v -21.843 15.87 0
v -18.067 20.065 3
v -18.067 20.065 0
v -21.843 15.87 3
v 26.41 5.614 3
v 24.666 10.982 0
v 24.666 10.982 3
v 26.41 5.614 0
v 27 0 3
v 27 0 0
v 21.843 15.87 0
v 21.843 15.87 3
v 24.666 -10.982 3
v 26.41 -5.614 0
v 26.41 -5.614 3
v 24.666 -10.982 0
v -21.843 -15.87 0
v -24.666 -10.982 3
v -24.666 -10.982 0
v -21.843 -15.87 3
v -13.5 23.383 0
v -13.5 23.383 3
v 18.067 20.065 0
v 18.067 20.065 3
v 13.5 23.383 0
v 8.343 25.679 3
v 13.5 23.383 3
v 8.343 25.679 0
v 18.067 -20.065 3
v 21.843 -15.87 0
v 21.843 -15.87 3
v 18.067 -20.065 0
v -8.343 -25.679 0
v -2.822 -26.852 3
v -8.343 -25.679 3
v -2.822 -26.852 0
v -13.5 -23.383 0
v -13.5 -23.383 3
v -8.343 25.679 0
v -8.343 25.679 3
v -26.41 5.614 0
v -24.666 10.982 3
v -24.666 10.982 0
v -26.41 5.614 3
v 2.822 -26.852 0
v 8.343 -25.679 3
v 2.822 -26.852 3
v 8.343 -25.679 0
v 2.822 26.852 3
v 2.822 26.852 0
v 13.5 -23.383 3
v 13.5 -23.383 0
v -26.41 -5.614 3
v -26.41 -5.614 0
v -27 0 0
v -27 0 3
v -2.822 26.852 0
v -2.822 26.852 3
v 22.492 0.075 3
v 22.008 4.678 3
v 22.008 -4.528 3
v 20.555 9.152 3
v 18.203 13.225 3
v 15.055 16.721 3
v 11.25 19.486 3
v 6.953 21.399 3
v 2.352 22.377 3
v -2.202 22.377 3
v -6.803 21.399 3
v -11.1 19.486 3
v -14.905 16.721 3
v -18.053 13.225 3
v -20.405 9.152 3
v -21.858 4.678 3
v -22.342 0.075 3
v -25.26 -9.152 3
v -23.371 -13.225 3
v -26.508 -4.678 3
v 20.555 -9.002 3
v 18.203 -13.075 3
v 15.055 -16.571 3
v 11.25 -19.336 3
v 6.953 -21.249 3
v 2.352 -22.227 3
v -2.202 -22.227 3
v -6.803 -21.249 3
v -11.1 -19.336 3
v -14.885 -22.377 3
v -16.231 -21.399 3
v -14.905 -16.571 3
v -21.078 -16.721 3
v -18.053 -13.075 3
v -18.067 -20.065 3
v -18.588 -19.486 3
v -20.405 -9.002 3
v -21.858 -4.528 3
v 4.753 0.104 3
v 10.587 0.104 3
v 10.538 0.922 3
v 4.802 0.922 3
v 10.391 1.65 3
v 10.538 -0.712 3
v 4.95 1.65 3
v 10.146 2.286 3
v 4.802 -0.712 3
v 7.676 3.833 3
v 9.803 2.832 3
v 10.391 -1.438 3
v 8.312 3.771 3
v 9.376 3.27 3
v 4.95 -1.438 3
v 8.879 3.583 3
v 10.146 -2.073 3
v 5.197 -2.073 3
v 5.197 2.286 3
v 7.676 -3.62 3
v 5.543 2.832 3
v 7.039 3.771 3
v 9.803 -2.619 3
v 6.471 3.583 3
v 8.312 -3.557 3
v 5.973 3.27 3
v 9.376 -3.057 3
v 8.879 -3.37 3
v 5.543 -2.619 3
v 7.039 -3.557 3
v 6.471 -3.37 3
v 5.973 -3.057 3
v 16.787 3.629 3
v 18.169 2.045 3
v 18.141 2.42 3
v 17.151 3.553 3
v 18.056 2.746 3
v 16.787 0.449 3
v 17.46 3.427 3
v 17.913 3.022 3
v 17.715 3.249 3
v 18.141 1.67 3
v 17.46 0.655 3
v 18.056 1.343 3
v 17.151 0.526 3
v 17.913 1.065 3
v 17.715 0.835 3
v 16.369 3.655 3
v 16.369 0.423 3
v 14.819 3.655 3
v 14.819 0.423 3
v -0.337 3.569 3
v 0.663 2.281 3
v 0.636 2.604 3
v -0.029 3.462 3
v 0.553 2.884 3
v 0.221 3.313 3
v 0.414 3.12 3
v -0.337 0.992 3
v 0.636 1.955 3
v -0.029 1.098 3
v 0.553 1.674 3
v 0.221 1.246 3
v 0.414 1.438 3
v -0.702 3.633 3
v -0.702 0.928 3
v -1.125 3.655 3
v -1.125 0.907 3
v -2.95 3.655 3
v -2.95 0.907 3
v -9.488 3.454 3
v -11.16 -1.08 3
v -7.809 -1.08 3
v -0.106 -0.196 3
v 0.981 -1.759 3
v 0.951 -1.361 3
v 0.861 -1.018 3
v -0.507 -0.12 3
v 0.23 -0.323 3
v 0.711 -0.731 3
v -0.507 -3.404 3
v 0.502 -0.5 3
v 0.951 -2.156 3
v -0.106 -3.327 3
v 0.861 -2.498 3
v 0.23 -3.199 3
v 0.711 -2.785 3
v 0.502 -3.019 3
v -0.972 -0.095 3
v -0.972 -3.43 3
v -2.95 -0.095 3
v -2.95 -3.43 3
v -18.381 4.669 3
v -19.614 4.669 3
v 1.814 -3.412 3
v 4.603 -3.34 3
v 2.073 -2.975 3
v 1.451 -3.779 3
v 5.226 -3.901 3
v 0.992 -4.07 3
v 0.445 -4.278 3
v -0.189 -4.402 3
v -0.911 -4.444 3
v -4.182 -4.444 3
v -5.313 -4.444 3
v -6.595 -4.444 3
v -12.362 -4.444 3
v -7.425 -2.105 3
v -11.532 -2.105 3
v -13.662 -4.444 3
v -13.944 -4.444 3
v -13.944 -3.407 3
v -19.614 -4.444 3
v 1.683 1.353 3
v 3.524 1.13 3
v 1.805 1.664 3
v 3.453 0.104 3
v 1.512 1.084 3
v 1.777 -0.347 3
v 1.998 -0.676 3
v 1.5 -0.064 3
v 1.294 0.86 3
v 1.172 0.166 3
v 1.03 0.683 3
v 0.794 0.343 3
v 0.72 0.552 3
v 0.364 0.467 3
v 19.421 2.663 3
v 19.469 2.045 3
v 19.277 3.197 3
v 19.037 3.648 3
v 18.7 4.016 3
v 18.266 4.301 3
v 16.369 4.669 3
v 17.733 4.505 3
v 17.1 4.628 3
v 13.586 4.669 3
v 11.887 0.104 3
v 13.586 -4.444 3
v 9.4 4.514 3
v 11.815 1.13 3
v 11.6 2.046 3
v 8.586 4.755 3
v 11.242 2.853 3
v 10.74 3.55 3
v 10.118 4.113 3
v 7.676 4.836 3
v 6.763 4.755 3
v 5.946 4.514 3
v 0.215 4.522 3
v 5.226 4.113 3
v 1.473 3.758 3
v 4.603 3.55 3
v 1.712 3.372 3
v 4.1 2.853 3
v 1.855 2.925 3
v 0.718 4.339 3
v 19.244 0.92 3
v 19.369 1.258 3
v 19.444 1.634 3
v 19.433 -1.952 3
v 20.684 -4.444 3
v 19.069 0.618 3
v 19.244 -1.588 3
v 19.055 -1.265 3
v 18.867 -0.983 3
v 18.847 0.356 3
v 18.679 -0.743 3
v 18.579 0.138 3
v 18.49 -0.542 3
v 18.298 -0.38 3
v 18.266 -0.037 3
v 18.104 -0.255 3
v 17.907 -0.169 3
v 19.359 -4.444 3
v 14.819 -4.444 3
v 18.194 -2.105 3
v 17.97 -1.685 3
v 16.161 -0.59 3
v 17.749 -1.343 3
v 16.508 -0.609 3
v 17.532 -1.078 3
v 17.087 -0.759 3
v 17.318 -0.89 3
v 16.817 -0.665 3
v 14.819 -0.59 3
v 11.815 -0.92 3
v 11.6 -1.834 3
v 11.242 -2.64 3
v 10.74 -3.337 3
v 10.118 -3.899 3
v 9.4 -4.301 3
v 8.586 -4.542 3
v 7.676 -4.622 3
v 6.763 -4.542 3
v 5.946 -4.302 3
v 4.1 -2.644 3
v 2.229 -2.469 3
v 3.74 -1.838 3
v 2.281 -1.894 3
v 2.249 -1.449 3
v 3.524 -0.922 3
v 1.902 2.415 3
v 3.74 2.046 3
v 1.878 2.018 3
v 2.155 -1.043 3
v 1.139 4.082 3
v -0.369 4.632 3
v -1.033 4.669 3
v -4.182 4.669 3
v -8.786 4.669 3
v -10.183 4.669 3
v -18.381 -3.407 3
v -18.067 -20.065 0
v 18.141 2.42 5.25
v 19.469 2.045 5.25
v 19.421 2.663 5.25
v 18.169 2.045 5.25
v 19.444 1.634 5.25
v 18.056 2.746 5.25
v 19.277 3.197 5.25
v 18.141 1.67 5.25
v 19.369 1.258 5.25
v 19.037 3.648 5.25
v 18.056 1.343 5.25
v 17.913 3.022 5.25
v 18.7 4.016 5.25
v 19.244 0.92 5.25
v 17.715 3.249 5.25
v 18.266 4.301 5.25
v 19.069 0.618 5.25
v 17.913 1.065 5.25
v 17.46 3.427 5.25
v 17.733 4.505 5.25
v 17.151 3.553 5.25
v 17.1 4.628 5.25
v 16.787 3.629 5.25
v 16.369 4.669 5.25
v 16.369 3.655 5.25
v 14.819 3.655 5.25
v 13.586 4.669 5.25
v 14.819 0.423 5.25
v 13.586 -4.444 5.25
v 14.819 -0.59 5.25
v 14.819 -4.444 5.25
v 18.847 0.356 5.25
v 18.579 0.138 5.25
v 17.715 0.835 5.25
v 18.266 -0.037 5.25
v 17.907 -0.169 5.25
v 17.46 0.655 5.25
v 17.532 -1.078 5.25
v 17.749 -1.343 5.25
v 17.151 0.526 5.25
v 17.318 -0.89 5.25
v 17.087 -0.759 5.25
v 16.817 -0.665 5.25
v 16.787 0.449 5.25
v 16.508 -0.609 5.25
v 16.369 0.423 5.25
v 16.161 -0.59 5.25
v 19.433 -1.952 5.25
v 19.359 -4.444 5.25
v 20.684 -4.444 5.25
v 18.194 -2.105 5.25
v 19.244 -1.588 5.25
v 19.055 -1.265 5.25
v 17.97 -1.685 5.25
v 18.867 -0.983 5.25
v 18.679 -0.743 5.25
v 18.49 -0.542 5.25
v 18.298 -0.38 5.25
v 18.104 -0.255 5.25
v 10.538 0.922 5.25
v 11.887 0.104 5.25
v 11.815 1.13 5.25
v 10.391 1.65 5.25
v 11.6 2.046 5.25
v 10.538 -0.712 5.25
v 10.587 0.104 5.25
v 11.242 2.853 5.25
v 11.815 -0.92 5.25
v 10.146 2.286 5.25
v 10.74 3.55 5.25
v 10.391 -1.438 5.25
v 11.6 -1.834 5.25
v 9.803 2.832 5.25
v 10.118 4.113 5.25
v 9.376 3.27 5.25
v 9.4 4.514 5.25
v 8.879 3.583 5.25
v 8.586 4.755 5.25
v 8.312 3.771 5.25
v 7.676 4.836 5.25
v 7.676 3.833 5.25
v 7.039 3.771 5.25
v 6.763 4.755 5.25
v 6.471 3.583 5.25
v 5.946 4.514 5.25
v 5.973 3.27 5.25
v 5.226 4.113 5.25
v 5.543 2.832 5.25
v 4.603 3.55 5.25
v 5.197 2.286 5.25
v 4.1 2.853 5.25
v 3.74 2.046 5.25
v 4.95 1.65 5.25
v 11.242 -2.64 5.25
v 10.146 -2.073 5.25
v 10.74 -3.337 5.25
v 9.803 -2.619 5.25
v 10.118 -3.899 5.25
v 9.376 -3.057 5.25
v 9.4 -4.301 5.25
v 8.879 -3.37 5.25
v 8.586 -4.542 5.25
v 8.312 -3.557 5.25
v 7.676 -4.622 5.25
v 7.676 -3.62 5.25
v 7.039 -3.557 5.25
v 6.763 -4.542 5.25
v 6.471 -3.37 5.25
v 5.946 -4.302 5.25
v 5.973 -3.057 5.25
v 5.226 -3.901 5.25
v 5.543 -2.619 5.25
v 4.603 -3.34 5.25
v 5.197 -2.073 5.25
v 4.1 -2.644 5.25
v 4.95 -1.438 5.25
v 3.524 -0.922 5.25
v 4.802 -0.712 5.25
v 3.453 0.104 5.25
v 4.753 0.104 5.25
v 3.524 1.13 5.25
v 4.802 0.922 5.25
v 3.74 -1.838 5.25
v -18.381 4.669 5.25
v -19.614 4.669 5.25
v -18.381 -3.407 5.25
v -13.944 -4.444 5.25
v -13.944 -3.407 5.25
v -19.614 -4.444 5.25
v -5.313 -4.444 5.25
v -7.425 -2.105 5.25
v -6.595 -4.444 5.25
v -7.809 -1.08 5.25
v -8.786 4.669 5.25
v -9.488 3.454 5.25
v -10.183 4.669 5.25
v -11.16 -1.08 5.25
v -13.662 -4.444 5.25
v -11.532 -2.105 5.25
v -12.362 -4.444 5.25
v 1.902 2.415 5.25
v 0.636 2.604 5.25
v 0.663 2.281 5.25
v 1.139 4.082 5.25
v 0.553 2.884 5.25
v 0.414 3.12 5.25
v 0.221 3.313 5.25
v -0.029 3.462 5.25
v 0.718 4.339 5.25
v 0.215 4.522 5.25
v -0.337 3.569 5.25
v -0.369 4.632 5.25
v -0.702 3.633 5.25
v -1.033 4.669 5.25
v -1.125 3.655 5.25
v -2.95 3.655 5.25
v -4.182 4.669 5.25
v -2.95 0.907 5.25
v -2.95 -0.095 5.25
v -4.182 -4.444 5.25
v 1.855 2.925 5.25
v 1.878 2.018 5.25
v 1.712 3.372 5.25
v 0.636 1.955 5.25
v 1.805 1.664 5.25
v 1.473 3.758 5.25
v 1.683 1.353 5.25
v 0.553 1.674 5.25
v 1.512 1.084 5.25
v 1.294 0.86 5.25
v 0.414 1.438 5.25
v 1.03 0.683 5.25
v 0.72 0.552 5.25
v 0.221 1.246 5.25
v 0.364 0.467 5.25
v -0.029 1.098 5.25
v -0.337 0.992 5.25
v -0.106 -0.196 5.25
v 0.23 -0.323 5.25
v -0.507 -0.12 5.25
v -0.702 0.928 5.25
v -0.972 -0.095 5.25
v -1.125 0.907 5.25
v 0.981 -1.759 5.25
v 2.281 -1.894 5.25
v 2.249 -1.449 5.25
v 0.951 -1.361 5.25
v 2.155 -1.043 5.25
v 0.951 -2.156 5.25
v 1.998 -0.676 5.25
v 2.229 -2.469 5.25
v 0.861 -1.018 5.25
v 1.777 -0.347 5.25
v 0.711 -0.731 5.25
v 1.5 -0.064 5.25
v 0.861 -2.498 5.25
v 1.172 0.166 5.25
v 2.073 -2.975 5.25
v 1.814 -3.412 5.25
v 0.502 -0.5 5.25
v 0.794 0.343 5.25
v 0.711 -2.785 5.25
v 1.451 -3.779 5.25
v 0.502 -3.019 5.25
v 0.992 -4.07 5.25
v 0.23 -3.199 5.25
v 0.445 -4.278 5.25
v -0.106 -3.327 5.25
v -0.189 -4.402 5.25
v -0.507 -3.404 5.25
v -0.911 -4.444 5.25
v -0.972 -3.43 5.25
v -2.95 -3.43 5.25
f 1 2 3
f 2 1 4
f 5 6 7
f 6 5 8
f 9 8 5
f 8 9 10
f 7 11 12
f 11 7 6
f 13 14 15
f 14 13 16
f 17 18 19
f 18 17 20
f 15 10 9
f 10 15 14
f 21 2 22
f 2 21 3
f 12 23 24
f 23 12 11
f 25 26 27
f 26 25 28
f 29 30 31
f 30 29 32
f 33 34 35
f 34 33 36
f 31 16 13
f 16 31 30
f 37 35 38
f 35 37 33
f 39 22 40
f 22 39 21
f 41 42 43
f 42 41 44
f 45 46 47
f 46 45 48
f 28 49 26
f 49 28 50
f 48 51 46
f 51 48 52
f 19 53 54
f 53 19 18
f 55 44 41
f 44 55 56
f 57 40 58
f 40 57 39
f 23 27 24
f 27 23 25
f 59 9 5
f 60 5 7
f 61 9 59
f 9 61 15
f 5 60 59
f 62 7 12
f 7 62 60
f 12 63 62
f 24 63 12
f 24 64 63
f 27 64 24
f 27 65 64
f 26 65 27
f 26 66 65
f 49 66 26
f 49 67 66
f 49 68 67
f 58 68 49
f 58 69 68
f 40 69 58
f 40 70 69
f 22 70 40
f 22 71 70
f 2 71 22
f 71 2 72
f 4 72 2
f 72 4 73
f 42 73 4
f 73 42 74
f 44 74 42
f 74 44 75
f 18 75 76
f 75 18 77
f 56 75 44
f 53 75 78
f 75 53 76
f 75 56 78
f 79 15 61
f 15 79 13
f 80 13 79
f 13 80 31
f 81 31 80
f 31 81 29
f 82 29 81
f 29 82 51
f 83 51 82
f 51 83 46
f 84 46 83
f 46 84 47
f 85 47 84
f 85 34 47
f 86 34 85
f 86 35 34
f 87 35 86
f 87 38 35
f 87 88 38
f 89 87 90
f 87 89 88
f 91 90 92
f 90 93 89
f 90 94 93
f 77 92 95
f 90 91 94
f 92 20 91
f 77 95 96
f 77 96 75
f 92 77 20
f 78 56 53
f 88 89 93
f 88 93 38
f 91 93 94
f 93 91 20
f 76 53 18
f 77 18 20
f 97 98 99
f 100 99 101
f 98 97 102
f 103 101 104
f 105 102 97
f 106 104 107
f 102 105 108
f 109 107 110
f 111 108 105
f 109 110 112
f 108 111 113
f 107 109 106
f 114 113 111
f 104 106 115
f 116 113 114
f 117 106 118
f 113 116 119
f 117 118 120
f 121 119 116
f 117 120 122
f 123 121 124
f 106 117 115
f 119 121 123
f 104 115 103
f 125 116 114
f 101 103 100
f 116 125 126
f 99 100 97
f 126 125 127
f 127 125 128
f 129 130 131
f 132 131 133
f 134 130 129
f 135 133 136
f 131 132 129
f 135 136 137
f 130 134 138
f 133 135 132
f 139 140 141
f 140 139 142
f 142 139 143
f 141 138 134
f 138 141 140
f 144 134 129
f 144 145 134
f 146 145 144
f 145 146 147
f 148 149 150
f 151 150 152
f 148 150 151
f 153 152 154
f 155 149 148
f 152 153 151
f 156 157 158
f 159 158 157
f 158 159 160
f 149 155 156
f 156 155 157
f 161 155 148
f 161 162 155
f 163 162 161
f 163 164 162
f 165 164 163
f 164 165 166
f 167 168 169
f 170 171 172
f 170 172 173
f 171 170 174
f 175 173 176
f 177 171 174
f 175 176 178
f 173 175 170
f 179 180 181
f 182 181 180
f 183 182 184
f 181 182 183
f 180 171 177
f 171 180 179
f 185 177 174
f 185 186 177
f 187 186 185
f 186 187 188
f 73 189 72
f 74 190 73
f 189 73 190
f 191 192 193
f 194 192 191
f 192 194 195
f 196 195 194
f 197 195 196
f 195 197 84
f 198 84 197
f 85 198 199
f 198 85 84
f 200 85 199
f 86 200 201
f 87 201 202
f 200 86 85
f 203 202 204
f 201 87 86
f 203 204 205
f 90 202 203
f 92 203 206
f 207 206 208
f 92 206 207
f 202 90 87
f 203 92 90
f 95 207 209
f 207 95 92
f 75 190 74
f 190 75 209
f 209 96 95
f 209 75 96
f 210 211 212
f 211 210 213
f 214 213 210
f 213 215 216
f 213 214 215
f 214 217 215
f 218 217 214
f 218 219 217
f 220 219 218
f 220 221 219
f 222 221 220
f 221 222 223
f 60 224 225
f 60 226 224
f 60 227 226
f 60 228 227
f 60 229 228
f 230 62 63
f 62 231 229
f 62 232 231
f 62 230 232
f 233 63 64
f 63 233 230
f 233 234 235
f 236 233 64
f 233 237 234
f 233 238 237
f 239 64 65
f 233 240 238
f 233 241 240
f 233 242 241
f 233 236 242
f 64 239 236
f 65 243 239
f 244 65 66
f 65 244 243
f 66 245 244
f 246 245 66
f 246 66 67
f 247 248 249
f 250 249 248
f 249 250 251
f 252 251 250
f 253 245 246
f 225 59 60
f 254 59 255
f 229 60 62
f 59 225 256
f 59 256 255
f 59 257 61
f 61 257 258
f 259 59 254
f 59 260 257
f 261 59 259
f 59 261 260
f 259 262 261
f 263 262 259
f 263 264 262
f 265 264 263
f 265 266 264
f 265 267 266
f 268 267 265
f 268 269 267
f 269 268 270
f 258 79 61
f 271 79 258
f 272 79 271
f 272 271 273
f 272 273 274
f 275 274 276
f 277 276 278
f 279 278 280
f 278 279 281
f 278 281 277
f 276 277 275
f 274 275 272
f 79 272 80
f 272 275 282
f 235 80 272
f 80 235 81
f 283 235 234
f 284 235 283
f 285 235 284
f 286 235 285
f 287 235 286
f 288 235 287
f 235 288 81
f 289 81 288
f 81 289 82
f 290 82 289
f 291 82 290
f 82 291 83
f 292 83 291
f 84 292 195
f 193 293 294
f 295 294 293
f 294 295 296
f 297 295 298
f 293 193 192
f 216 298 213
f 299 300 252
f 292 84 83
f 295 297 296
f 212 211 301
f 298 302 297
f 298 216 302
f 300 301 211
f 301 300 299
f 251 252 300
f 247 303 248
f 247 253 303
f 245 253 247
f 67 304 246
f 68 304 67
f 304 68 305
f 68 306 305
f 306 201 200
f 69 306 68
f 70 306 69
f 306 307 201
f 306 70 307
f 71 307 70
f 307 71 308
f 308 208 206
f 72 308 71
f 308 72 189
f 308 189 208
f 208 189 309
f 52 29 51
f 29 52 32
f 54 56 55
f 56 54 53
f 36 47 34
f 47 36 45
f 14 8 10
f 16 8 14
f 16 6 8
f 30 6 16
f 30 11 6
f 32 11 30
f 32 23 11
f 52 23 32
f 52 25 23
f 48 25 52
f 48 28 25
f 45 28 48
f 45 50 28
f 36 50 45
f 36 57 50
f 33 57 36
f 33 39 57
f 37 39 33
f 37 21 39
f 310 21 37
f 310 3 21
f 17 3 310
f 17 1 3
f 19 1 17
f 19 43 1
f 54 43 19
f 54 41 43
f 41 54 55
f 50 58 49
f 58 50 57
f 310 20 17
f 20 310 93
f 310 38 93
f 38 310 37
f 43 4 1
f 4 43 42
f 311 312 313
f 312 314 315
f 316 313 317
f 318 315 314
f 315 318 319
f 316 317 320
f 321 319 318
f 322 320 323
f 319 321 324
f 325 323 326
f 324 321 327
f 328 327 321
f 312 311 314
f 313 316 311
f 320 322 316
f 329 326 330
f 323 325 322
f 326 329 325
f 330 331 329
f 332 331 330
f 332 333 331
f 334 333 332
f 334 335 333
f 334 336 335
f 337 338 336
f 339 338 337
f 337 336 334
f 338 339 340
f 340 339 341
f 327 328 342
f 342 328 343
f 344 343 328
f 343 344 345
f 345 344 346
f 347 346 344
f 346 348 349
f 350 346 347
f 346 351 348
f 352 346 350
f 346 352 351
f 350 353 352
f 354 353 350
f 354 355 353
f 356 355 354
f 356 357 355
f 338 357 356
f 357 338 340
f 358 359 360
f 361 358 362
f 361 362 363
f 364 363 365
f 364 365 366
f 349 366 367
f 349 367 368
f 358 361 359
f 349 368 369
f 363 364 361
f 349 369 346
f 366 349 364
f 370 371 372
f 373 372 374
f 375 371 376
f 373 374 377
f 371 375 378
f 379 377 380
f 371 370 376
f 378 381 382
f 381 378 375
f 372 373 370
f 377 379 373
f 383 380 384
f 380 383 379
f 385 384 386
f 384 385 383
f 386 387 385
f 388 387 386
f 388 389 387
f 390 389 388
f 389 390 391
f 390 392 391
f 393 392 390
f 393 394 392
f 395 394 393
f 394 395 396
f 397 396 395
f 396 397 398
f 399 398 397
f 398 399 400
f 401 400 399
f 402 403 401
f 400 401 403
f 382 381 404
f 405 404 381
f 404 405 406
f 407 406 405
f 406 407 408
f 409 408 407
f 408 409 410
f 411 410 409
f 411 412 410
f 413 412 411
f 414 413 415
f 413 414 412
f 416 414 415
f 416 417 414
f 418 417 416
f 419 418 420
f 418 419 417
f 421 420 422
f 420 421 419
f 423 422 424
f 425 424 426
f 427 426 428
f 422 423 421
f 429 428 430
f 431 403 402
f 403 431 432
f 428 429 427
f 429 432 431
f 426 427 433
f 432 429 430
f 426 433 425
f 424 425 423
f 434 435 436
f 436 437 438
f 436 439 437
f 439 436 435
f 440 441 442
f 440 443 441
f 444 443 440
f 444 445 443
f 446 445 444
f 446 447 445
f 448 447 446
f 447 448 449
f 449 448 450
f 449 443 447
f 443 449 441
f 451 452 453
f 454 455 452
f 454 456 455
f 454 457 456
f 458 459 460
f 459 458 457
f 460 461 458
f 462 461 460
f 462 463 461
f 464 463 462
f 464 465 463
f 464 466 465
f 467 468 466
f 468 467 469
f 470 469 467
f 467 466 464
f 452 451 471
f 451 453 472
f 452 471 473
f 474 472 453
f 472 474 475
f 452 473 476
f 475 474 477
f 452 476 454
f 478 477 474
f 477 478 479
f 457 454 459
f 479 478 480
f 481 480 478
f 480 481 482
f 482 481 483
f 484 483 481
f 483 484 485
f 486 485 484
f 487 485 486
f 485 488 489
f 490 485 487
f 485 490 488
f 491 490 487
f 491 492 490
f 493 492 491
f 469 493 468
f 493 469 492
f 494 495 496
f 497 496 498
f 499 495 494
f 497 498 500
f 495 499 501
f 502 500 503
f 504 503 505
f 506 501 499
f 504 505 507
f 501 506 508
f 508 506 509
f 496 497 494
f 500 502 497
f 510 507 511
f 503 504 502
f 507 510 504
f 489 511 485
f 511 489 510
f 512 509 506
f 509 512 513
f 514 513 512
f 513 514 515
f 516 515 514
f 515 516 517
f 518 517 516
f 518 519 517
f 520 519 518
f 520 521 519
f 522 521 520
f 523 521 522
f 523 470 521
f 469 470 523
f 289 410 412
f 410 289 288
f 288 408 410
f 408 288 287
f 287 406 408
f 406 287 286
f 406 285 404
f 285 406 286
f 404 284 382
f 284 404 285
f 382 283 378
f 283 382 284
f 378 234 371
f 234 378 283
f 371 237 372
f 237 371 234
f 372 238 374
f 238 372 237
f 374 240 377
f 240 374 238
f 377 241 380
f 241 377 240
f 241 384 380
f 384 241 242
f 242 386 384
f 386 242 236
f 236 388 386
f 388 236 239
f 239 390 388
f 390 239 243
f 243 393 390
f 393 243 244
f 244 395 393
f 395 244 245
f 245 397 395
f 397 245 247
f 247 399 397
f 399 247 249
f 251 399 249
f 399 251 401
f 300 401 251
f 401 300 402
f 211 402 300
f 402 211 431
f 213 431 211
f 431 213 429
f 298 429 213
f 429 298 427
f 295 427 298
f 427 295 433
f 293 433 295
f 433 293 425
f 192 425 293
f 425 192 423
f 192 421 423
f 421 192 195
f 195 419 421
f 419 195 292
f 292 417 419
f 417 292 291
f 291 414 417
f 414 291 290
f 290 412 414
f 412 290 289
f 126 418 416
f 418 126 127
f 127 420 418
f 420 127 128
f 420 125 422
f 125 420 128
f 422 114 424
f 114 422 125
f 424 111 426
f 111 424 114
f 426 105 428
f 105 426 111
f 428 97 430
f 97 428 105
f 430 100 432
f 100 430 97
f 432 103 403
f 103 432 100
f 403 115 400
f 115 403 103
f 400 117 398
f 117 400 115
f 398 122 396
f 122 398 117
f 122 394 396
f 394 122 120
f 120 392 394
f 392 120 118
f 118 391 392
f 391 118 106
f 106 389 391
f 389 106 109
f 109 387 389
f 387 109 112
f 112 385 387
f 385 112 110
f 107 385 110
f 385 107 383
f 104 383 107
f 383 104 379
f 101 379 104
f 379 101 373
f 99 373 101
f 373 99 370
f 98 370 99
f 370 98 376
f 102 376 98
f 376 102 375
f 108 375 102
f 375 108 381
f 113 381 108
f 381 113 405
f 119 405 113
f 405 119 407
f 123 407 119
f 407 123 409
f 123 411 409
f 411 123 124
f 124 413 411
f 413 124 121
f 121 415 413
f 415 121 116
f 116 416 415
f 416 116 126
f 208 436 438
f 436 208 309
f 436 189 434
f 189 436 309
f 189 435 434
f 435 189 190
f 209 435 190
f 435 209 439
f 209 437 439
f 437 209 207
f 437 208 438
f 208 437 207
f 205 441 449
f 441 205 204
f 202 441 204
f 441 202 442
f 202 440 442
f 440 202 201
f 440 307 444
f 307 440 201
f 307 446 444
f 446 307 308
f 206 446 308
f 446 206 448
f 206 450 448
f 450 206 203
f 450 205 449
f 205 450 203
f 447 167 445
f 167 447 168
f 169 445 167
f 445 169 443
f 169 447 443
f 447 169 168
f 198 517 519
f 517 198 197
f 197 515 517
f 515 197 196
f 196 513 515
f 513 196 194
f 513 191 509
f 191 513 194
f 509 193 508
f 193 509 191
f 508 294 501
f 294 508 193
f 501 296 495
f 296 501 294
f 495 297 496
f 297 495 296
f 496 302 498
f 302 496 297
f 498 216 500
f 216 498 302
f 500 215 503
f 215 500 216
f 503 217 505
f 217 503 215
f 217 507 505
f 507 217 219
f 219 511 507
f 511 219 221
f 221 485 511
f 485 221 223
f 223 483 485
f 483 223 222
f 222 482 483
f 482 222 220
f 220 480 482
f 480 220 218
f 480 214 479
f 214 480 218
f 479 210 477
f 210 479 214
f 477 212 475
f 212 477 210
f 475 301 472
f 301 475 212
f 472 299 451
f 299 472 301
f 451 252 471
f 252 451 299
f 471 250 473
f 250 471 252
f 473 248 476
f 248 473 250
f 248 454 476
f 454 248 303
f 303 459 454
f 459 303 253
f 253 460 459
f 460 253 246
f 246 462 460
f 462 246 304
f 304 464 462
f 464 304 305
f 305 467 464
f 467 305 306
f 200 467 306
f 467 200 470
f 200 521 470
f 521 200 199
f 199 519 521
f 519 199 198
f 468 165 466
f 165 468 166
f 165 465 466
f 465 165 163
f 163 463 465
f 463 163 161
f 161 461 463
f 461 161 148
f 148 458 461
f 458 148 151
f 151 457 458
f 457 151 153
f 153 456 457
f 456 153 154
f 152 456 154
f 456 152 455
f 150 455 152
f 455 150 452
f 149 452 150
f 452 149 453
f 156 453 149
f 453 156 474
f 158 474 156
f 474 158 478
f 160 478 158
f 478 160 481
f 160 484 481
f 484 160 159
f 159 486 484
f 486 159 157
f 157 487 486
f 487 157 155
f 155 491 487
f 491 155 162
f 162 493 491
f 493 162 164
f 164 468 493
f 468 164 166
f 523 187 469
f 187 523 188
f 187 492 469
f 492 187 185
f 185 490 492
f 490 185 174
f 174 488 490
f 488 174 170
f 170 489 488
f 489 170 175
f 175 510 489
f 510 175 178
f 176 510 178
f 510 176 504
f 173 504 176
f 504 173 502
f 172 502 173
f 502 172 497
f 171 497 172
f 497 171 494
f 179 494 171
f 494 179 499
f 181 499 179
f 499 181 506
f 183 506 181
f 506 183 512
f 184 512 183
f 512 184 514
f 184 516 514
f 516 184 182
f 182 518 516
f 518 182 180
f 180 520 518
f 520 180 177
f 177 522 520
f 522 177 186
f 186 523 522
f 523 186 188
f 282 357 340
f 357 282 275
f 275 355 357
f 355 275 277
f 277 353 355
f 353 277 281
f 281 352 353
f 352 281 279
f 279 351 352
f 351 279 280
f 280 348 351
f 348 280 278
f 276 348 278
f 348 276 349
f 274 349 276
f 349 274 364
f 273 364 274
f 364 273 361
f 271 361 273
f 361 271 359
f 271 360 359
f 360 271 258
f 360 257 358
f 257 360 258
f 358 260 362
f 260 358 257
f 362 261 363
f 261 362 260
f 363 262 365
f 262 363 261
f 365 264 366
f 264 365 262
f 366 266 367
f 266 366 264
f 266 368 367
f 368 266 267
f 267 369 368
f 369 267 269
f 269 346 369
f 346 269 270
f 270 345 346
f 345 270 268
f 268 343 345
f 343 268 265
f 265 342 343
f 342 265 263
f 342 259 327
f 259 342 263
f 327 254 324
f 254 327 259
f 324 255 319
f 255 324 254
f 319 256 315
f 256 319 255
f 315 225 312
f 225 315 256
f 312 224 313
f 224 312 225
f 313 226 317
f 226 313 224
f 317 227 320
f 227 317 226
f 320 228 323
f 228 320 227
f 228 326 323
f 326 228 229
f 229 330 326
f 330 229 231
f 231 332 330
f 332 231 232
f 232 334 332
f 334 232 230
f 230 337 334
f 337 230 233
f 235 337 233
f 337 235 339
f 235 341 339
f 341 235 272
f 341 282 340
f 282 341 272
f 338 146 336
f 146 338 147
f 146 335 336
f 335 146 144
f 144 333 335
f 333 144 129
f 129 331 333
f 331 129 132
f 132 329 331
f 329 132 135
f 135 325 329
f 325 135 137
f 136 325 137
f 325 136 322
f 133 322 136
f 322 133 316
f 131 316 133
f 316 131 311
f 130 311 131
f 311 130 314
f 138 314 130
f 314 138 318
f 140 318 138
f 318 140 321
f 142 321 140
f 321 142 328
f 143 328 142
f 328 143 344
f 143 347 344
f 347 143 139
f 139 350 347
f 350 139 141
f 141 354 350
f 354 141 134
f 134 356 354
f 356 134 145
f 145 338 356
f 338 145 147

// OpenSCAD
translate(v = [0, 0, 3.0]) {
	difference() {
		union() {
			translate(v = [0, 0, -3.0]) {
				cylinder(h = 3.0, r = 27.0);
			}
			linear_extrude(height = 2.25) {
				text(font = "Mic 32Bold", halign = "center", size = 9, text = "LABOR", valign = "center");
			}
		}
		minkowski() {
			difference() {
				cylinder(h = 3.0, r = 27.0);
				cylinder(h = 3.0, r = 22.5);
			}
			cube(size = [0.15, 0.15, 0.15]);
		}
	}
}
